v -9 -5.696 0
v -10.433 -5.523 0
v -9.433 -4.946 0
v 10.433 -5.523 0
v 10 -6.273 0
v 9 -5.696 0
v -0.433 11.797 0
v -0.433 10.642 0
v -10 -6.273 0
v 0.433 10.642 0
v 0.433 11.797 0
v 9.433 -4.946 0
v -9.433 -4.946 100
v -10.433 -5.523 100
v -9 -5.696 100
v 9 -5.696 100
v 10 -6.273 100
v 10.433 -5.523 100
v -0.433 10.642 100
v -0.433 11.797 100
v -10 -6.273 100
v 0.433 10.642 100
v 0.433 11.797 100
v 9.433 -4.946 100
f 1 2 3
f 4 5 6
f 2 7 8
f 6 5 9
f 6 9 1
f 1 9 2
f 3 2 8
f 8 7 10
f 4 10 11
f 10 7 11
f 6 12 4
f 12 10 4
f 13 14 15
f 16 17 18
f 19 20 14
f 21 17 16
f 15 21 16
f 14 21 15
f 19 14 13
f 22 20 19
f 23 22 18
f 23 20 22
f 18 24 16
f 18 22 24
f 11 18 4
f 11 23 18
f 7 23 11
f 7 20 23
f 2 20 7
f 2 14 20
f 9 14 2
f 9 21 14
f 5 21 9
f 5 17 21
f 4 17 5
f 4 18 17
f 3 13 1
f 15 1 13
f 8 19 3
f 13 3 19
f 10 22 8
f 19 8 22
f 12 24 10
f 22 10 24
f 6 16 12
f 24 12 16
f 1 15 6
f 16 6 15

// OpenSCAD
/* 2022-05-12 dishwasher status sign v2 */
/* by Torfinn Ingolfsen */

// History:
// 2022-05-12 initial version

// using a permanet marker, write on each side (in order)
// dirty
// running
// clean
//
// put sign in holder
//
sign_length = 100; // the gadget is going to be 100 mm wide
sign_height = 20; // and 20 mm high
side_thickness = 2;

// cribbed from a forum post
/*
isogonal.scad

        +
       /|\
      /o| \
   r /  |y \
    /   |   \
   +----+----+
   |  x      |
   |<-- l -->|
*/

module isogonal(length, number)
{
    angle = 360 / number;
    theta = angle / 2;
    x = length / 2;
    r = x / sin(theta);
    y = r * cos(theta);

    // hull() is better than for() and scale() method.
    hull()
    {
        for (i = [0 : number-1])
        {
                rotate([0, 0, angle*i]) translate([0, -y, 0])
                square([length, 1], center=true);
        }
    }
}

module d_sign(length, height, thickness)
{
    linear_extrude(height = length, center = false, twist = 0, convexity = 10)
    difference()
    {
        isogonal(height, 3);
        isogonal(height - thickness, 3);
    }
}

d_sign(sign_length, sign_height, side_thickness);
